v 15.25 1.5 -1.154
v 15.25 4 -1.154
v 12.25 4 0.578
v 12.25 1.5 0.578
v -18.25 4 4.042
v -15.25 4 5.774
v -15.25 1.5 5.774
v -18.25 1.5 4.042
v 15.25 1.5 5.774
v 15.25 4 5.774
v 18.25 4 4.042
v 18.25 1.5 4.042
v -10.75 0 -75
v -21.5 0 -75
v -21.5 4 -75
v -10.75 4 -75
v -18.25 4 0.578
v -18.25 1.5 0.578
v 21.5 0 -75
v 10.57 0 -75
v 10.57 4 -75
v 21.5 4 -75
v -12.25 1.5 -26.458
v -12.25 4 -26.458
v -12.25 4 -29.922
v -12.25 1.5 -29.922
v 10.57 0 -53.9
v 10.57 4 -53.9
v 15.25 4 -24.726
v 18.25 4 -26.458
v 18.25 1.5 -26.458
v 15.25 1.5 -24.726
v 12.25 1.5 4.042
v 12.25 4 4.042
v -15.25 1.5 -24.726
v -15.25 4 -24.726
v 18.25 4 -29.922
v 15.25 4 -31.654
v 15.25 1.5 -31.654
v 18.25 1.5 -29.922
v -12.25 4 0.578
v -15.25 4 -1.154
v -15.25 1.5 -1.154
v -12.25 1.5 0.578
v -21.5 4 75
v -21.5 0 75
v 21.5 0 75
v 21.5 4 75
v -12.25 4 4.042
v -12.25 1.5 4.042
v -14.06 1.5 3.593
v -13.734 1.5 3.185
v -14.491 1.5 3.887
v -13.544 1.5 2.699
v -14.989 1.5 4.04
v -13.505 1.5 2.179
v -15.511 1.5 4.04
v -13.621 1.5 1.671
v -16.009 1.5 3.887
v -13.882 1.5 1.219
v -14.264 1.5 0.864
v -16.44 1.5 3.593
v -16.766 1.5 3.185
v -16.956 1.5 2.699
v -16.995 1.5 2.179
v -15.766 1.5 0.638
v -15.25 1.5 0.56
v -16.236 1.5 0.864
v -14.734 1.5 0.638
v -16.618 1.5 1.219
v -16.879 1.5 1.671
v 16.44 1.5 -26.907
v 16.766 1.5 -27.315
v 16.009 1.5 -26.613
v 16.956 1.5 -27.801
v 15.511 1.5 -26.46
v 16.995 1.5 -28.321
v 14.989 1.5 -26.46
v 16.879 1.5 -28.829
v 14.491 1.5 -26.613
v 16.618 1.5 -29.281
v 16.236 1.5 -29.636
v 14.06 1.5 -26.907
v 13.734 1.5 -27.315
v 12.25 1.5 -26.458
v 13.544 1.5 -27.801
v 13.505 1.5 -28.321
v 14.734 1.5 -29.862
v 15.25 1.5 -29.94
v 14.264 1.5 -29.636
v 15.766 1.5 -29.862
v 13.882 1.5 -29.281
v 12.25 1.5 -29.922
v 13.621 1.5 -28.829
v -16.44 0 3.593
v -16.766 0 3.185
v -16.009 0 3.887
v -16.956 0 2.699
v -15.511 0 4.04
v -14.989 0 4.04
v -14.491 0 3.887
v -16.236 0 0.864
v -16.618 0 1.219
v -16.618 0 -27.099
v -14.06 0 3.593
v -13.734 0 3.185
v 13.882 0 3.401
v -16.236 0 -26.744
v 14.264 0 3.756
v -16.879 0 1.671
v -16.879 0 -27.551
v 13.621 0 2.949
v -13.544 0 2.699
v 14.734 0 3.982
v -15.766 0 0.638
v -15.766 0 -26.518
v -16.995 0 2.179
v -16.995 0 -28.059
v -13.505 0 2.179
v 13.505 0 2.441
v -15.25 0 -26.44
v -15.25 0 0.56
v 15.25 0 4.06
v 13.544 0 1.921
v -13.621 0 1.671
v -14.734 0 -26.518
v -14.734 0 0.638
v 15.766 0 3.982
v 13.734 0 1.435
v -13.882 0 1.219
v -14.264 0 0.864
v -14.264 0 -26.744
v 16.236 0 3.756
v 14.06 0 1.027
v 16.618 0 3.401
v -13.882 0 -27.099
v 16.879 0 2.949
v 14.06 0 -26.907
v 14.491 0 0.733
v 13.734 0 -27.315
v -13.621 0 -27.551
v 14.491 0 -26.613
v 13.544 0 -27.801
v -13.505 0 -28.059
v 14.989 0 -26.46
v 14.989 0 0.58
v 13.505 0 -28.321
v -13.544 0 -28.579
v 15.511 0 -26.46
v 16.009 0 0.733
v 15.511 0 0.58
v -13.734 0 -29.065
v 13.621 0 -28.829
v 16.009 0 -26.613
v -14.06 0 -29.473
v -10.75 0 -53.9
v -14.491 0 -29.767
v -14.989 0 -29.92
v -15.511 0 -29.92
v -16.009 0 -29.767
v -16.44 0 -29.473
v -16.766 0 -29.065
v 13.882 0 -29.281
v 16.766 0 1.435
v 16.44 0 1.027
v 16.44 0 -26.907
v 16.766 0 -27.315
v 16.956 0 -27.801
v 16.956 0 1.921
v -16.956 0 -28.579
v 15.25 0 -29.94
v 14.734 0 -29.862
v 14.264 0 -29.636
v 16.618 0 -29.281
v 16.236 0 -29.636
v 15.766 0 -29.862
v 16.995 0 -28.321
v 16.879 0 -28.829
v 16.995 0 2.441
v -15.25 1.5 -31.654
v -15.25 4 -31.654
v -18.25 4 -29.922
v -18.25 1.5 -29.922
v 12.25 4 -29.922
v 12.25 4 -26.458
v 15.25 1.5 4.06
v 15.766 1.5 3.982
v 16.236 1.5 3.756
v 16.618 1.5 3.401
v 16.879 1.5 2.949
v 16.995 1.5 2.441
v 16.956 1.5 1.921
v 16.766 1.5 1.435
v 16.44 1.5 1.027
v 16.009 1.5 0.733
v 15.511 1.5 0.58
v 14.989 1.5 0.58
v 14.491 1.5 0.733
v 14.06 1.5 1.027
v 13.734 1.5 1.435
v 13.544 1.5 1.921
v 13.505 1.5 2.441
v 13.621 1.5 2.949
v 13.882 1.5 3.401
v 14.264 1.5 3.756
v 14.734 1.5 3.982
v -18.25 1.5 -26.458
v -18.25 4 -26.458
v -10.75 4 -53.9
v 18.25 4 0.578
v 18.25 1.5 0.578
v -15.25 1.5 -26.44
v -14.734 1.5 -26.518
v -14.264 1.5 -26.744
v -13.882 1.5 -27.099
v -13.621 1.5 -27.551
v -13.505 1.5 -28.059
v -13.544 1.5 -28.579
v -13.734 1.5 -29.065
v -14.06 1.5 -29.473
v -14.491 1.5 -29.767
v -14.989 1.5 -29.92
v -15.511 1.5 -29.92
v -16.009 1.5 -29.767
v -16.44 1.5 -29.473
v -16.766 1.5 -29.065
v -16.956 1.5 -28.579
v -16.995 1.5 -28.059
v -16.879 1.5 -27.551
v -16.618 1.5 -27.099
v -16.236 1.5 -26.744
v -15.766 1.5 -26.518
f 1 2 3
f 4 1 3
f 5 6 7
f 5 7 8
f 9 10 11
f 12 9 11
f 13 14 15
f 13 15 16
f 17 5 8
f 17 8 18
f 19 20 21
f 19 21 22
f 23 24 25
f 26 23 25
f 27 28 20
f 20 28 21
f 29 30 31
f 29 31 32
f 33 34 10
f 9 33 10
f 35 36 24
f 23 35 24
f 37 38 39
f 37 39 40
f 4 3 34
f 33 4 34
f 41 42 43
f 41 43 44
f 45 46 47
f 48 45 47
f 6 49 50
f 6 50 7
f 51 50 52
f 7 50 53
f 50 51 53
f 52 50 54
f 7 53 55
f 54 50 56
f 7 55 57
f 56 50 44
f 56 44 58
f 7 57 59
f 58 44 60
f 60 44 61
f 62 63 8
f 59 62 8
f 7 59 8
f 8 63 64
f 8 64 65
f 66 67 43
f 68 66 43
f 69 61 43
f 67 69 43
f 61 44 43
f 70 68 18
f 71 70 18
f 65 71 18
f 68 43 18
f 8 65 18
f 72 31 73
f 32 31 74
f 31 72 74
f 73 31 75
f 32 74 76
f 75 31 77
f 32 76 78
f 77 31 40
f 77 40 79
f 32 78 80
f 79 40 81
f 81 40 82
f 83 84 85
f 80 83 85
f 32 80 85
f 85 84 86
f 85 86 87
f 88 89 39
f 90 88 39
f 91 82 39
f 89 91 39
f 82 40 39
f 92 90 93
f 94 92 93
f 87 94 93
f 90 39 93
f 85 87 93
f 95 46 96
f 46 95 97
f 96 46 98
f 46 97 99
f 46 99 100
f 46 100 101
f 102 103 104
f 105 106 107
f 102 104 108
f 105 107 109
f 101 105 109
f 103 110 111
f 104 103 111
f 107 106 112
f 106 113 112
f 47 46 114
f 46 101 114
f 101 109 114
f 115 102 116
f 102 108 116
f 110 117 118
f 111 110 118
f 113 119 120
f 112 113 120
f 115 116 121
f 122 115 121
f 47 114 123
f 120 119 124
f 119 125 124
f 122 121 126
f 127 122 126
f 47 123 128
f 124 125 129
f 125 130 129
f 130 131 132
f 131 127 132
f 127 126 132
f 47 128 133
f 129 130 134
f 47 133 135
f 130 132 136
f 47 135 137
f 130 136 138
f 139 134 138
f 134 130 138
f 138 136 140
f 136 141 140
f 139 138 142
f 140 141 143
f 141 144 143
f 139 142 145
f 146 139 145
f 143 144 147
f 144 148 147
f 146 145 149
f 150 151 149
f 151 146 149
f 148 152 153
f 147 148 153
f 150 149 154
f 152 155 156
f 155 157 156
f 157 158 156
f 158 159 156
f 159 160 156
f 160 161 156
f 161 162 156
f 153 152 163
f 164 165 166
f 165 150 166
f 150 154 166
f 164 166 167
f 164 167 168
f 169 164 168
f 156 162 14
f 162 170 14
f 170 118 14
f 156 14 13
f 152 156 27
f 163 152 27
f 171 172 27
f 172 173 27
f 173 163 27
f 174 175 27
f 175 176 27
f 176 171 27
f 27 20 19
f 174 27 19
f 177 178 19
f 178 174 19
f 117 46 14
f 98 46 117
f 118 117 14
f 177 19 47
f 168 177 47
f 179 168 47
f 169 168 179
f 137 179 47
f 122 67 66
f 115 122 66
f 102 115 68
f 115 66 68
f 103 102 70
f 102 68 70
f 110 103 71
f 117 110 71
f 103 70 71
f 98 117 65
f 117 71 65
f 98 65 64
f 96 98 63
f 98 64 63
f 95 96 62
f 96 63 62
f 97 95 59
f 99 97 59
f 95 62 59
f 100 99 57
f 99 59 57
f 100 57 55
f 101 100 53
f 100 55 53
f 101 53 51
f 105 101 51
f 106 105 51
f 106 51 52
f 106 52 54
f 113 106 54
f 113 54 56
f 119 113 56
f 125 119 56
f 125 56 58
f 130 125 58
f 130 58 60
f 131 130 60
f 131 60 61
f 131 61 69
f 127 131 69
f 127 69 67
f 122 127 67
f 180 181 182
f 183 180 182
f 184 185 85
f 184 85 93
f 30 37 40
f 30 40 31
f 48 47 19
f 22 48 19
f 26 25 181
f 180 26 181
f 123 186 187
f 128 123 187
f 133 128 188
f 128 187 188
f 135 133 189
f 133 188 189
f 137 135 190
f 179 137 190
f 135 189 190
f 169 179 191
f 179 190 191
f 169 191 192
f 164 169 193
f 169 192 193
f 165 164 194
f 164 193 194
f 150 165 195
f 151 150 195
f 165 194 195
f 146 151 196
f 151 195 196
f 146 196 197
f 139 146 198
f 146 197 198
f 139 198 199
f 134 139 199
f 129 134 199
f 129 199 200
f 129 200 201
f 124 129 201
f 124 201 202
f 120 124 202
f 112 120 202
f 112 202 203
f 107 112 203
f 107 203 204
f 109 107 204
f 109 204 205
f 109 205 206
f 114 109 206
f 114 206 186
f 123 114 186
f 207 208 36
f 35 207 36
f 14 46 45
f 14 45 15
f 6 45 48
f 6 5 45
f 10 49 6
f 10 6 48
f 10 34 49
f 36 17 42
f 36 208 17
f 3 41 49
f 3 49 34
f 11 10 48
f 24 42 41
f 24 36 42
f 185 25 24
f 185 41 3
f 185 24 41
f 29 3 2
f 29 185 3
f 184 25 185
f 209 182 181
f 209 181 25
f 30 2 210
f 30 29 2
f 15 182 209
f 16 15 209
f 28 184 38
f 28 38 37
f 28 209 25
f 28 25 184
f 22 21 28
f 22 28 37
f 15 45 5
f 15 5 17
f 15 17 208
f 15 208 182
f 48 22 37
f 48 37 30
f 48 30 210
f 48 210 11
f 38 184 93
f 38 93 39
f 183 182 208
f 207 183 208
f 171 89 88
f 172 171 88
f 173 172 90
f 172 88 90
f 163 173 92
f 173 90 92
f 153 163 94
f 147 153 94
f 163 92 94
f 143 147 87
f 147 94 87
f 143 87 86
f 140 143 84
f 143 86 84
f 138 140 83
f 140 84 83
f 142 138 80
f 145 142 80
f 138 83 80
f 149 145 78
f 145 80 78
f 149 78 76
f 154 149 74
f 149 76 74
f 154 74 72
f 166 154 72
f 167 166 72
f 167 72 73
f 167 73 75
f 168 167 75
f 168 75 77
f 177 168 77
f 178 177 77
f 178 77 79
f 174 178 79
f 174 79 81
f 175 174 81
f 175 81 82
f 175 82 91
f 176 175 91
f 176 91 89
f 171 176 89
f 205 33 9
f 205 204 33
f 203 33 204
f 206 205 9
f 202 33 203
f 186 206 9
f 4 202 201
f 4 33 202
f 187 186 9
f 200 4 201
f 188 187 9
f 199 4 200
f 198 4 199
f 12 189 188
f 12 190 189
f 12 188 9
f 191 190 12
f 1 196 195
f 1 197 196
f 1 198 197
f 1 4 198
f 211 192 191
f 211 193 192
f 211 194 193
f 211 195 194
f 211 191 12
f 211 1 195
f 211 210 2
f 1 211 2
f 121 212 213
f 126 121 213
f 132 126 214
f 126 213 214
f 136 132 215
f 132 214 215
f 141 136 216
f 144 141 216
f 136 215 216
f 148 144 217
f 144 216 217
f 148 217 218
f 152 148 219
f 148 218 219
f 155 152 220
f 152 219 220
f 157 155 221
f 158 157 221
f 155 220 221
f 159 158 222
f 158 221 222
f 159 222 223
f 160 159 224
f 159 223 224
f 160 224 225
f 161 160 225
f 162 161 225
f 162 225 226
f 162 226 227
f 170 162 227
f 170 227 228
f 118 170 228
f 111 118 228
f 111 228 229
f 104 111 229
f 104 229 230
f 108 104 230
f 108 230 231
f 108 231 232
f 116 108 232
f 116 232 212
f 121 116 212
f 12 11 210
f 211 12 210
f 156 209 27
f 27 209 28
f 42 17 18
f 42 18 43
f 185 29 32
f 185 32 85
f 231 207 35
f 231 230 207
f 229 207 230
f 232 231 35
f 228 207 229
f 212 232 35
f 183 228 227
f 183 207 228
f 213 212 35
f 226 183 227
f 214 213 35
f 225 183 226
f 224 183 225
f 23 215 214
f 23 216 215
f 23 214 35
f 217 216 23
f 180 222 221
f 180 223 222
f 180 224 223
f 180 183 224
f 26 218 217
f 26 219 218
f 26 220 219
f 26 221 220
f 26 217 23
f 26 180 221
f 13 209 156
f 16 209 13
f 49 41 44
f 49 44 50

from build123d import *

# Parameters (mm, degrees)
SKETCH1_W           = 43
SKETCH1_H           = 150
BOSS_EXTRUDE1_DEPTH = 4
SKETCH2_W           = 10.57
SKETCH2_H           = 21.1
SKETCH2_W_2         = 10.75
CUT_EXTRUDE1_DEPTH  = 79.123299982
CUT_EXTRUDE2_DEPTH  = 2.5
SKETCH4_R           = 1.75
CUT_EXTRUDE3_DEPTH  = 79.123299982


with BuildPart() as part:
    # Sketch1 → Boss-Extrude1 (new body)
    with BuildSketch(Plane(origin=(0, 0, 0), x_dir=(1, 0, 0), z_dir=(0, 1, 0))):
        Rectangle(SKETCH1_W, SKETCH1_H)
    extrude(amount=BOSS_EXTRUDE1_DEPTH)

    # Sketch2 → Cut-Extrude1 (cut, through all)
    with BuildSketch(Plane(origin=(0, 4, 0), x_dir=(1, 0, 0), z_dir=(0, 1, 0))):
        with Locations((5.285, 64.45)):
            Rectangle(SKETCH2_W, SKETCH2_H)
        with Locations((-5.375, 64.45)):
            Rectangle(SKETCH2_W_2, SKETCH2_H)
    extrude(amount=-CUT_EXTRUDE1_DEPTH, mode=Mode.SUBTRACT)

    # Sketch3 → Cut-Extrude2 (cut)
    with BuildSketch(Plane(origin=(0, 4, 0), x_dir=(1, 0, 0), z_dir=(0, 1, 0))):
        Polygon((-15.25, 31.654101615), (-18.25, 29.922050808), (-18.25, 26.457949192), (-15.25, 24.725898385), (-12.25, 26.457949192), (-12.25, 29.922050808), align=None)
        Polygon((12.25, 29.922050808), (15.25, 31.654101615), (18.25, 29.922050808), (18.25, 26.457949192), (15.25, 24.725898385), (12.25, 26.457949192), align=None)
        Polygon((12.25, -0.577949192), (12.25, -4.042050808), (15.25, -5.774101615), (18.25, -4.042050808), (18.25, -0.577949192), (15.25, 1.154101615), align=None)
        Polygon((-12.25, -4.042050808), (-15.25, -5.774101615), (-18.25, -4.042050808), (-18.25, -0.577949192), (-15.25, 1.154101615), (-12.25, -0.577949192), align=None)
    extrude(amount=-CUT_EXTRUDE2_DEPTH, mode=Mode.SUBTRACT)

    # Sketch4 → Cut-Extrude3 (cut, through all)
    with BuildSketch(Plane(origin=(0, 4, 0), x_dir=(1, 0, 0), z_dir=(0, 1, 0))):
        with Locations(Location((-15.25, 28.19, 0), (0, 0, 270))):
            Circle(SKETCH4_R)
        with Locations(Location((15.25, 28.19, 0), (0, 0, 90))):
            Circle(SKETCH4_R)
        with Locations(Location((15.25, -2.31, 0), (0, 0, 270))):
            Circle(SKETCH4_R)
        with Locations(Location((-15.25, -2.31, 0), (0, 0, 90))):
            Circle(SKETCH4_R)
    extrude(amount=-CUT_EXTRUDE3_DEPTH, mode=Mode.SUBTRACT)


solid = part.part
